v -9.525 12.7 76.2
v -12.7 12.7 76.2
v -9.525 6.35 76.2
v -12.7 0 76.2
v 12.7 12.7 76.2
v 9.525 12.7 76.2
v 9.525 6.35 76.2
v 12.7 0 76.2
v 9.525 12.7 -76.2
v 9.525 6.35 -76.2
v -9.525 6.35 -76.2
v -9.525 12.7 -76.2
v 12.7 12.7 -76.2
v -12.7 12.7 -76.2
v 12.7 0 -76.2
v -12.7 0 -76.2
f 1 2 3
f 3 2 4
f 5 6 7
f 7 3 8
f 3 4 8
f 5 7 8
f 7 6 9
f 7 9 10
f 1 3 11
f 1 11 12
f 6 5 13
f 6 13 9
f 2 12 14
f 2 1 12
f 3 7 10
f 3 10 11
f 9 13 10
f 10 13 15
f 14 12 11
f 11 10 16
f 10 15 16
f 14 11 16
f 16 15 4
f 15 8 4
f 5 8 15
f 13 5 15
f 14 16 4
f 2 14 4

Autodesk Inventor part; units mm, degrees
ref_plane "YZ Plane" through (0, 0, 0) normal (1, 0, 0) x (0, 1, 0)
ref_plane "XZ Plane" through (0, 0, 0) normal (0, 1, 0) x (-1, 0, 0)
ref_plane "XY Plane" through (0, 0, 0) normal (0, 0, 1) x (1, 0, 0)
sketch "Sketch1" plane through (0, 0, 0) normal (0, 1, 0) x (-1, 0, 0)
  line L0 (12.7, 76.2) -> (-12.7, 76.2)
  line L1 (-12.7, 76.2) -> (-12.7, -76.2)
  line L2 (-12.7, -76.2) -> (12.7, -76.2)
  line L3 (12.7, -76.2) -> (12.7, 76.2)
  line L4 (12.7, 76.2) -> (-12.7, -76.2) construction
  line L5 (-12.7, 76.2) -> (12.7, -76.2) construction
  point P0 (0, 0)
  dimension "d0" = 25.4
  dimension "d1" = 152.4
extrude "Extrusion1" add sketch "Sketch1" along normal blind 12.7
sketch "Sketch2" plane through (-12.7, 0, 76.2) normal (0, 0, 1) x (1, 0, 0)
  line L0 (0, 0) -> (25.4, 0) projected
  line L1 (25.4, 0) -> (25.4, 12.7) projected
  line L2 (0, 12.7) -> (25.4, 12.7) projected
  line L3 (0, 0) -> (0, 12.7) projected
  line L4 (3.175, 12.7) -> (22.225, 12.7)
  line L5 (22.225, 12.7) -> (22.225, 6.35)
  line L6 (22.225, 6.35) -> (3.175, 6.35)
  line L7 (3.175, 6.35) -> (3.175, 12.7)
  point P0 (12.7, 0)
  dimension "d4" = 3.175
  dimension "d5" = 6.35
  dimension "d6" = 3.175
extrude "Extrusion2" cut sketch "Sketch2" against normal through all contours L2 L5 L6 L7
equation "\"d6\" = d4"
properties part number "Base"
